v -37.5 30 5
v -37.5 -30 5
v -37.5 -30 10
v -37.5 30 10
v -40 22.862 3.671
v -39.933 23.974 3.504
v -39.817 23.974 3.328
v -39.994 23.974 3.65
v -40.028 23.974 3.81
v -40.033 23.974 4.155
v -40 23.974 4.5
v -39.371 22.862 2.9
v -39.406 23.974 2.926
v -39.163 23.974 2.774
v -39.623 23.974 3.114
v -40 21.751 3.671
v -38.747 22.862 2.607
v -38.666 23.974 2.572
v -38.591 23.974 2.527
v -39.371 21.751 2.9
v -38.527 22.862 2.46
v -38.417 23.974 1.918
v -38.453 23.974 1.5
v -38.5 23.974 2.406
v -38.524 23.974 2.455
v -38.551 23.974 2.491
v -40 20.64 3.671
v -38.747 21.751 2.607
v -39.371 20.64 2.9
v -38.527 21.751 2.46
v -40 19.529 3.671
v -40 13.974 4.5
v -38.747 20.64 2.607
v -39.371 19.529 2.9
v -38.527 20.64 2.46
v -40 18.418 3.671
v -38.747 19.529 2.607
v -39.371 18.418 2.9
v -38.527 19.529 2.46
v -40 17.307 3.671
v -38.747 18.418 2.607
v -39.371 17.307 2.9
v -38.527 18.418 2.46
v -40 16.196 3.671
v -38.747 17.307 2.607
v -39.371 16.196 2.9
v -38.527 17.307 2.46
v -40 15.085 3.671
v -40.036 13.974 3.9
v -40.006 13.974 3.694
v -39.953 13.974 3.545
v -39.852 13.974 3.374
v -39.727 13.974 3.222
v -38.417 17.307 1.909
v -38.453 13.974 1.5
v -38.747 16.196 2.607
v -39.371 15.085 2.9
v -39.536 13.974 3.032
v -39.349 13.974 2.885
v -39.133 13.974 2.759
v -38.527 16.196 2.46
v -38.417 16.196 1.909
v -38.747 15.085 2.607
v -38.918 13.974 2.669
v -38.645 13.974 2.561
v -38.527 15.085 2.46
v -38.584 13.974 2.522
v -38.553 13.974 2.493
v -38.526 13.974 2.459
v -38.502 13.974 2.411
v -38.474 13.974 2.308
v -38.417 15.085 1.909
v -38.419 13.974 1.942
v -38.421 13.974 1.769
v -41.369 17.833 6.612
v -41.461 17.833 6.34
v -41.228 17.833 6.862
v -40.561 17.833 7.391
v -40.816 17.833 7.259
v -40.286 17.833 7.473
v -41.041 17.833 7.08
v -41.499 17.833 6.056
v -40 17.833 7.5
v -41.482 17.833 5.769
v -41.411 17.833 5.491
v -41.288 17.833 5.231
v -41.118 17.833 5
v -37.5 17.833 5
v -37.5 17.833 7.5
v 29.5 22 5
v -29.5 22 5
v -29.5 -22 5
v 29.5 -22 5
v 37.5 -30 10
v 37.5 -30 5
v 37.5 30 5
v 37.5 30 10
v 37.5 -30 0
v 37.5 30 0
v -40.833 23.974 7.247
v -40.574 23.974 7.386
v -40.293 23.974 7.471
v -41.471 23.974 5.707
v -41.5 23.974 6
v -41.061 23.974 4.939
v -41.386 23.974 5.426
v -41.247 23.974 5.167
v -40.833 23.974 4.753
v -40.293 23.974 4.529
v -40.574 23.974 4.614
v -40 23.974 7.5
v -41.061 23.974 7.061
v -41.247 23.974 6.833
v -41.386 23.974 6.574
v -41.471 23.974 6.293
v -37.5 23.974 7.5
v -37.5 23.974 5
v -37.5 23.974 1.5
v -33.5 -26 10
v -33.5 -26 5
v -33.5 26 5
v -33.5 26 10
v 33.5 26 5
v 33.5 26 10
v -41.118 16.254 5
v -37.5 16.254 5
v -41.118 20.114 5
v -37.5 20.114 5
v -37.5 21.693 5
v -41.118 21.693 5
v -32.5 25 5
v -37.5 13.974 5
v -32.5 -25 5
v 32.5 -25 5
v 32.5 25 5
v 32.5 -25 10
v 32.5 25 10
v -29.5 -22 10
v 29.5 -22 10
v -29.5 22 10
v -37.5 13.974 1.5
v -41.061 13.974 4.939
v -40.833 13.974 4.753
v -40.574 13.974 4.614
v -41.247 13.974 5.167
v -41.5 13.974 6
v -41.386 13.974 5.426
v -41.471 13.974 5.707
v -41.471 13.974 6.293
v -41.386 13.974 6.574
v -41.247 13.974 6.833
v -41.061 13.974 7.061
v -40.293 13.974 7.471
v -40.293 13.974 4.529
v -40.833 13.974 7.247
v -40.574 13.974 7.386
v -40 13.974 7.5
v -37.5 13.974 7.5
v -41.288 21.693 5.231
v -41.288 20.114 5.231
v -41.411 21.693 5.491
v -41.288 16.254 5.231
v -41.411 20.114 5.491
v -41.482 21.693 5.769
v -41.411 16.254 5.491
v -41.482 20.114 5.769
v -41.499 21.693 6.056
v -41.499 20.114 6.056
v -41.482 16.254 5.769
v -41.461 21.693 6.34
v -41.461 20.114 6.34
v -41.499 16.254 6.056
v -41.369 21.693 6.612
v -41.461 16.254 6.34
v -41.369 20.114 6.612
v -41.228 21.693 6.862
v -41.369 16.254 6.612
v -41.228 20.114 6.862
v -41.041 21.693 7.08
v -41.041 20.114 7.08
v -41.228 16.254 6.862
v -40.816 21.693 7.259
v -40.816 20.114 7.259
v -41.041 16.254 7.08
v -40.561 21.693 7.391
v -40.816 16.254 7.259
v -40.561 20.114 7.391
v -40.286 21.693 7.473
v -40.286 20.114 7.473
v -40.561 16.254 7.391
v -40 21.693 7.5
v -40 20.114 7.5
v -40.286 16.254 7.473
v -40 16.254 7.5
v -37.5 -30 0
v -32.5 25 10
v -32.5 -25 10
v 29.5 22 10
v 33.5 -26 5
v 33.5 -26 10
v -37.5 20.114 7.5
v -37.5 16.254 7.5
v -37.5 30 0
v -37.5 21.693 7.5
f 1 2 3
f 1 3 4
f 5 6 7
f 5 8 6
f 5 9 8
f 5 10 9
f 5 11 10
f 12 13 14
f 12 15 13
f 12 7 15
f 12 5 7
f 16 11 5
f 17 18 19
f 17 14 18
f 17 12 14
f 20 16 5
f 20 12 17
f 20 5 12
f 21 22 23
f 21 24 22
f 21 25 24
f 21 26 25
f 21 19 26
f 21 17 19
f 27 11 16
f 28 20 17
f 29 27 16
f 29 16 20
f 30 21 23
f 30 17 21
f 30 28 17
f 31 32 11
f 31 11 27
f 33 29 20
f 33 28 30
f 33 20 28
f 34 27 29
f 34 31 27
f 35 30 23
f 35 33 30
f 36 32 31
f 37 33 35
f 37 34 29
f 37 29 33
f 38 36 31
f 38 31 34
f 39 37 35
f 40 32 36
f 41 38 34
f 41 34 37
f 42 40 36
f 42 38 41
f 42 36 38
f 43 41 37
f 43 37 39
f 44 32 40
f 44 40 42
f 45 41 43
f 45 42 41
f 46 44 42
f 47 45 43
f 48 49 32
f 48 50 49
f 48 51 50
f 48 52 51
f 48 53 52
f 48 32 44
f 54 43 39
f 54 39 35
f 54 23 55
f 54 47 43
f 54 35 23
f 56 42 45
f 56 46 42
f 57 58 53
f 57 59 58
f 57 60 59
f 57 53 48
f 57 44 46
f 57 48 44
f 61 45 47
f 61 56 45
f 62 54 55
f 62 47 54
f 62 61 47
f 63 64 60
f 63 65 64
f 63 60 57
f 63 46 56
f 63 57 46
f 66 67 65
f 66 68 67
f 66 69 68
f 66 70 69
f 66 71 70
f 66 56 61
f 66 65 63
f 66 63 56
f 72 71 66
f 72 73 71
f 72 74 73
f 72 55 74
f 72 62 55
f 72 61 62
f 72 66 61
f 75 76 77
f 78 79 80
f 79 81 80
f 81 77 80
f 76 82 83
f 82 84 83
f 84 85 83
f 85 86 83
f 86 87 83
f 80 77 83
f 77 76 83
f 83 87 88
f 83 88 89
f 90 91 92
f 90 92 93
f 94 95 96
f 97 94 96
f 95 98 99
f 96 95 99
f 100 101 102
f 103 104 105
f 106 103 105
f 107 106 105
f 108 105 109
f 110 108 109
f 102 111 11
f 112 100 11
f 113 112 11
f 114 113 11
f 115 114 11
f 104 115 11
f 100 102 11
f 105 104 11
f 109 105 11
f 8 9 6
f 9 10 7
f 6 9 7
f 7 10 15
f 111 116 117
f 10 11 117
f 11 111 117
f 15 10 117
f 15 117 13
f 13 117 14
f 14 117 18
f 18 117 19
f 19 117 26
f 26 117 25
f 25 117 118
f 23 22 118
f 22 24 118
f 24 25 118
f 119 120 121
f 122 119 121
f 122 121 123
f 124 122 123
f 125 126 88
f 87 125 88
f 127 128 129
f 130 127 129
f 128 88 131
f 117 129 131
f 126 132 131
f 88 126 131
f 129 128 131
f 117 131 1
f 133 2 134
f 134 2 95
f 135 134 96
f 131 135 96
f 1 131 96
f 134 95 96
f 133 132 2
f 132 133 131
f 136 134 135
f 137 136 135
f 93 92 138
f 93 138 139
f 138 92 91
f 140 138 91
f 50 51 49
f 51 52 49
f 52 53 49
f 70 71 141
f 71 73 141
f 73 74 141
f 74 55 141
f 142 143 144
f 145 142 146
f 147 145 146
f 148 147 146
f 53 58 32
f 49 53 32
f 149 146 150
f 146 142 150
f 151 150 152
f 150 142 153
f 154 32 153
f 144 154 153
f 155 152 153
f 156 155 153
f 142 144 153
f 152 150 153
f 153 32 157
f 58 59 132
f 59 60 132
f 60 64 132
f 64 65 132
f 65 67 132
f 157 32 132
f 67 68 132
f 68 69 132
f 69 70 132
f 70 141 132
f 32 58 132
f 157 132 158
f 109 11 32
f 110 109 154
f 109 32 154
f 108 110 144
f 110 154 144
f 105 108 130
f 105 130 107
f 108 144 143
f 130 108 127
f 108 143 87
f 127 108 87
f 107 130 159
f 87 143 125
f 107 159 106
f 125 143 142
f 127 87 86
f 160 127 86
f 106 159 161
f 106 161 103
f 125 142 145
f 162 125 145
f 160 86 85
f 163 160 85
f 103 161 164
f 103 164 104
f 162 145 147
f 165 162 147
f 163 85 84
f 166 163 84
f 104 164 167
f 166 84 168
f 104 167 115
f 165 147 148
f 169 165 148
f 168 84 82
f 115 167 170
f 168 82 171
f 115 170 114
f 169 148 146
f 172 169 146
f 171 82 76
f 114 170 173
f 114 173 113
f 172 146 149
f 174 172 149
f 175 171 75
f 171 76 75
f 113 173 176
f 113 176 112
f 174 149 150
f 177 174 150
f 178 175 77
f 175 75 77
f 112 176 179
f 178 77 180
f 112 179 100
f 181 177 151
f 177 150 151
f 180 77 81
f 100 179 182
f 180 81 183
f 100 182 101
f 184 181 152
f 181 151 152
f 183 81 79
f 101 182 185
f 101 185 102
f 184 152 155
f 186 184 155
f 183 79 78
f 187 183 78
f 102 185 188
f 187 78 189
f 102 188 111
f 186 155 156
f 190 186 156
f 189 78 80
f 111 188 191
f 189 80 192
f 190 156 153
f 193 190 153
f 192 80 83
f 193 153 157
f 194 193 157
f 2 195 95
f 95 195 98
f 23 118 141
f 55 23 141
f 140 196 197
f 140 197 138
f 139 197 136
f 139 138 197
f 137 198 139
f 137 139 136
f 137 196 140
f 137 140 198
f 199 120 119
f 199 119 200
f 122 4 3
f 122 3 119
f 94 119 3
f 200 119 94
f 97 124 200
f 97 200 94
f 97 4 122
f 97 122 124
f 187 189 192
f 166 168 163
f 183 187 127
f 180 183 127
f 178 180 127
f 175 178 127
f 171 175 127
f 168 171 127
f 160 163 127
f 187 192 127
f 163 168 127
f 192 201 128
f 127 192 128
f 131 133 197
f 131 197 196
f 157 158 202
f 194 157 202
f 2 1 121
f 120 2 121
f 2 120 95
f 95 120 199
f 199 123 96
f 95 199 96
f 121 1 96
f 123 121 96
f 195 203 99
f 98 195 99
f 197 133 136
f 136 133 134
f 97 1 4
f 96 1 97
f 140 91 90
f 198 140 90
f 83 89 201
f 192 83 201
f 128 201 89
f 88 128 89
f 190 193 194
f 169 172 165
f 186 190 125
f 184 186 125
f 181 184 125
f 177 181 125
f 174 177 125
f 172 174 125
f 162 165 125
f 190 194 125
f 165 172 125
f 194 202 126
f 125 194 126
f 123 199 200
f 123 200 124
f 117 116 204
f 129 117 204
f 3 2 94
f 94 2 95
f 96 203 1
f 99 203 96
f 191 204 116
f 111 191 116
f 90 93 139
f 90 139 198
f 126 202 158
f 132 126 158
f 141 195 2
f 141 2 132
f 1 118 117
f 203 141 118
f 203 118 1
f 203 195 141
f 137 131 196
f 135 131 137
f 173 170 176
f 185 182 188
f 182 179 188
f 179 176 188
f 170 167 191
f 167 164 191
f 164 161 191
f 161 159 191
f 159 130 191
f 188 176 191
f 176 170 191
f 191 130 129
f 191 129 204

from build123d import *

# Parameters (mm, degrees)
F0_W     = 75
F0_H     = 60
F1_DEPTH = 5
F2_W     = 65
F2_H     = 50
F2_W_2   = 59
F2_H_2   = 44
F3_DEPTH = 5
F4_W     = 75
F4_H     = 60
F4_W_2   = 67
F4_H_2   = 52
F5_DEPTH = 5
F7_DEPTH = 5
F9_DEPTH = 16.0273892857


with BuildPart() as f1:
    # F0 (on Top) → F1 (new body)
    with BuildSketch(Plane.XY):
        Rectangle(F0_W, F0_H)
    extrude(amount=F1_DEPTH)

    # F2 (on face) → F3 (join)
    with BuildSketch(Plane.XY.offset(5)):
        Rectangle(F2_W, F2_H)
        Rectangle(F2_W_2, F2_H_2, mode=Mode.SUBTRACT)
    extrude(amount=F3_DEPTH)

    # F6 (on face) → F7 (join)
    with BuildSketch(Plane(origin=(-37.5, 0, 0), x_dir=(0, -1, 0), z_dir=(-1, 0, 0))):
        Polygon((-21.6927667481, 7.5), (-23.9736107143, 7.5), (-23.9736107143, 1.5), (-13.9736107143, 1.5), (-13.9736107143, 7.5), (-16.2544546806, 7.5), (-16.2544546806, 5), (-17.8331887312, 5), (-17.8331887312, 7.5), (-20.1140326975, 7.5), (-20.1140326975, 5), (-21.6927667481, 5), align=None)
    extrude(amount=F7_DEPTH)

    # F8 (on face) → F9 (cut, through all)
    with BuildSketch(Plane.XZ.offset(-13.9736107143)):
        with BuildLine():
            Line((-42.5, 7.5), (-42.5, 1.5))
            Line((-42.5, 1.5), (-38.4533107281, 1.5))
            add(Edge.make_bspline(
                [(-40, 4.5), (-40.0332466707, 4.2033021988), (-40.0938903512, 3.6621097631), (-39.7141378275, 3.1884036491), (-39.3868051904, 2.8916751674), (-39.0474258601, 2.7075872934), (-38.7521333356, 2.615680849), (-38.4831825305, 2.4911583946), (-38.4607419928, 2.1554776724), (-38.3956996392, 1.9092815912), (-38.4326943281, 1.6464633482), (-38.4533107281, 1.5)],
                knots=[0, 0, 0, 0, 0.1593186871, 0.290605687, 0.4069134712, 0.5144588289, 0.6124296172, 0.7024350291, 0.7986834225, 0.8878102994, 1, 1, 1, 1], degree=3))
            ThreePointArc((-40, 4.5), (-41.5, 6), (-40, 7.5))
            Line((-40, 7.5), (-42.5, 7.5))
        make_face()
    extrude(amount=-F9_DEPTH, mode=Mode.SUBTRACT)


with BuildPart() as f5:
    # F4 (on face) → F5 (new body)
    with BuildSketch(Plane.XY.offset(5)):
        Rectangle(F4_W, F4_H)
        Rectangle(F4_W_2, F4_H_2, mode=Mode.SUBTRACT)
    extrude(amount=F5_DEPTH)


solid = Compound([f1.part, f5.part])
